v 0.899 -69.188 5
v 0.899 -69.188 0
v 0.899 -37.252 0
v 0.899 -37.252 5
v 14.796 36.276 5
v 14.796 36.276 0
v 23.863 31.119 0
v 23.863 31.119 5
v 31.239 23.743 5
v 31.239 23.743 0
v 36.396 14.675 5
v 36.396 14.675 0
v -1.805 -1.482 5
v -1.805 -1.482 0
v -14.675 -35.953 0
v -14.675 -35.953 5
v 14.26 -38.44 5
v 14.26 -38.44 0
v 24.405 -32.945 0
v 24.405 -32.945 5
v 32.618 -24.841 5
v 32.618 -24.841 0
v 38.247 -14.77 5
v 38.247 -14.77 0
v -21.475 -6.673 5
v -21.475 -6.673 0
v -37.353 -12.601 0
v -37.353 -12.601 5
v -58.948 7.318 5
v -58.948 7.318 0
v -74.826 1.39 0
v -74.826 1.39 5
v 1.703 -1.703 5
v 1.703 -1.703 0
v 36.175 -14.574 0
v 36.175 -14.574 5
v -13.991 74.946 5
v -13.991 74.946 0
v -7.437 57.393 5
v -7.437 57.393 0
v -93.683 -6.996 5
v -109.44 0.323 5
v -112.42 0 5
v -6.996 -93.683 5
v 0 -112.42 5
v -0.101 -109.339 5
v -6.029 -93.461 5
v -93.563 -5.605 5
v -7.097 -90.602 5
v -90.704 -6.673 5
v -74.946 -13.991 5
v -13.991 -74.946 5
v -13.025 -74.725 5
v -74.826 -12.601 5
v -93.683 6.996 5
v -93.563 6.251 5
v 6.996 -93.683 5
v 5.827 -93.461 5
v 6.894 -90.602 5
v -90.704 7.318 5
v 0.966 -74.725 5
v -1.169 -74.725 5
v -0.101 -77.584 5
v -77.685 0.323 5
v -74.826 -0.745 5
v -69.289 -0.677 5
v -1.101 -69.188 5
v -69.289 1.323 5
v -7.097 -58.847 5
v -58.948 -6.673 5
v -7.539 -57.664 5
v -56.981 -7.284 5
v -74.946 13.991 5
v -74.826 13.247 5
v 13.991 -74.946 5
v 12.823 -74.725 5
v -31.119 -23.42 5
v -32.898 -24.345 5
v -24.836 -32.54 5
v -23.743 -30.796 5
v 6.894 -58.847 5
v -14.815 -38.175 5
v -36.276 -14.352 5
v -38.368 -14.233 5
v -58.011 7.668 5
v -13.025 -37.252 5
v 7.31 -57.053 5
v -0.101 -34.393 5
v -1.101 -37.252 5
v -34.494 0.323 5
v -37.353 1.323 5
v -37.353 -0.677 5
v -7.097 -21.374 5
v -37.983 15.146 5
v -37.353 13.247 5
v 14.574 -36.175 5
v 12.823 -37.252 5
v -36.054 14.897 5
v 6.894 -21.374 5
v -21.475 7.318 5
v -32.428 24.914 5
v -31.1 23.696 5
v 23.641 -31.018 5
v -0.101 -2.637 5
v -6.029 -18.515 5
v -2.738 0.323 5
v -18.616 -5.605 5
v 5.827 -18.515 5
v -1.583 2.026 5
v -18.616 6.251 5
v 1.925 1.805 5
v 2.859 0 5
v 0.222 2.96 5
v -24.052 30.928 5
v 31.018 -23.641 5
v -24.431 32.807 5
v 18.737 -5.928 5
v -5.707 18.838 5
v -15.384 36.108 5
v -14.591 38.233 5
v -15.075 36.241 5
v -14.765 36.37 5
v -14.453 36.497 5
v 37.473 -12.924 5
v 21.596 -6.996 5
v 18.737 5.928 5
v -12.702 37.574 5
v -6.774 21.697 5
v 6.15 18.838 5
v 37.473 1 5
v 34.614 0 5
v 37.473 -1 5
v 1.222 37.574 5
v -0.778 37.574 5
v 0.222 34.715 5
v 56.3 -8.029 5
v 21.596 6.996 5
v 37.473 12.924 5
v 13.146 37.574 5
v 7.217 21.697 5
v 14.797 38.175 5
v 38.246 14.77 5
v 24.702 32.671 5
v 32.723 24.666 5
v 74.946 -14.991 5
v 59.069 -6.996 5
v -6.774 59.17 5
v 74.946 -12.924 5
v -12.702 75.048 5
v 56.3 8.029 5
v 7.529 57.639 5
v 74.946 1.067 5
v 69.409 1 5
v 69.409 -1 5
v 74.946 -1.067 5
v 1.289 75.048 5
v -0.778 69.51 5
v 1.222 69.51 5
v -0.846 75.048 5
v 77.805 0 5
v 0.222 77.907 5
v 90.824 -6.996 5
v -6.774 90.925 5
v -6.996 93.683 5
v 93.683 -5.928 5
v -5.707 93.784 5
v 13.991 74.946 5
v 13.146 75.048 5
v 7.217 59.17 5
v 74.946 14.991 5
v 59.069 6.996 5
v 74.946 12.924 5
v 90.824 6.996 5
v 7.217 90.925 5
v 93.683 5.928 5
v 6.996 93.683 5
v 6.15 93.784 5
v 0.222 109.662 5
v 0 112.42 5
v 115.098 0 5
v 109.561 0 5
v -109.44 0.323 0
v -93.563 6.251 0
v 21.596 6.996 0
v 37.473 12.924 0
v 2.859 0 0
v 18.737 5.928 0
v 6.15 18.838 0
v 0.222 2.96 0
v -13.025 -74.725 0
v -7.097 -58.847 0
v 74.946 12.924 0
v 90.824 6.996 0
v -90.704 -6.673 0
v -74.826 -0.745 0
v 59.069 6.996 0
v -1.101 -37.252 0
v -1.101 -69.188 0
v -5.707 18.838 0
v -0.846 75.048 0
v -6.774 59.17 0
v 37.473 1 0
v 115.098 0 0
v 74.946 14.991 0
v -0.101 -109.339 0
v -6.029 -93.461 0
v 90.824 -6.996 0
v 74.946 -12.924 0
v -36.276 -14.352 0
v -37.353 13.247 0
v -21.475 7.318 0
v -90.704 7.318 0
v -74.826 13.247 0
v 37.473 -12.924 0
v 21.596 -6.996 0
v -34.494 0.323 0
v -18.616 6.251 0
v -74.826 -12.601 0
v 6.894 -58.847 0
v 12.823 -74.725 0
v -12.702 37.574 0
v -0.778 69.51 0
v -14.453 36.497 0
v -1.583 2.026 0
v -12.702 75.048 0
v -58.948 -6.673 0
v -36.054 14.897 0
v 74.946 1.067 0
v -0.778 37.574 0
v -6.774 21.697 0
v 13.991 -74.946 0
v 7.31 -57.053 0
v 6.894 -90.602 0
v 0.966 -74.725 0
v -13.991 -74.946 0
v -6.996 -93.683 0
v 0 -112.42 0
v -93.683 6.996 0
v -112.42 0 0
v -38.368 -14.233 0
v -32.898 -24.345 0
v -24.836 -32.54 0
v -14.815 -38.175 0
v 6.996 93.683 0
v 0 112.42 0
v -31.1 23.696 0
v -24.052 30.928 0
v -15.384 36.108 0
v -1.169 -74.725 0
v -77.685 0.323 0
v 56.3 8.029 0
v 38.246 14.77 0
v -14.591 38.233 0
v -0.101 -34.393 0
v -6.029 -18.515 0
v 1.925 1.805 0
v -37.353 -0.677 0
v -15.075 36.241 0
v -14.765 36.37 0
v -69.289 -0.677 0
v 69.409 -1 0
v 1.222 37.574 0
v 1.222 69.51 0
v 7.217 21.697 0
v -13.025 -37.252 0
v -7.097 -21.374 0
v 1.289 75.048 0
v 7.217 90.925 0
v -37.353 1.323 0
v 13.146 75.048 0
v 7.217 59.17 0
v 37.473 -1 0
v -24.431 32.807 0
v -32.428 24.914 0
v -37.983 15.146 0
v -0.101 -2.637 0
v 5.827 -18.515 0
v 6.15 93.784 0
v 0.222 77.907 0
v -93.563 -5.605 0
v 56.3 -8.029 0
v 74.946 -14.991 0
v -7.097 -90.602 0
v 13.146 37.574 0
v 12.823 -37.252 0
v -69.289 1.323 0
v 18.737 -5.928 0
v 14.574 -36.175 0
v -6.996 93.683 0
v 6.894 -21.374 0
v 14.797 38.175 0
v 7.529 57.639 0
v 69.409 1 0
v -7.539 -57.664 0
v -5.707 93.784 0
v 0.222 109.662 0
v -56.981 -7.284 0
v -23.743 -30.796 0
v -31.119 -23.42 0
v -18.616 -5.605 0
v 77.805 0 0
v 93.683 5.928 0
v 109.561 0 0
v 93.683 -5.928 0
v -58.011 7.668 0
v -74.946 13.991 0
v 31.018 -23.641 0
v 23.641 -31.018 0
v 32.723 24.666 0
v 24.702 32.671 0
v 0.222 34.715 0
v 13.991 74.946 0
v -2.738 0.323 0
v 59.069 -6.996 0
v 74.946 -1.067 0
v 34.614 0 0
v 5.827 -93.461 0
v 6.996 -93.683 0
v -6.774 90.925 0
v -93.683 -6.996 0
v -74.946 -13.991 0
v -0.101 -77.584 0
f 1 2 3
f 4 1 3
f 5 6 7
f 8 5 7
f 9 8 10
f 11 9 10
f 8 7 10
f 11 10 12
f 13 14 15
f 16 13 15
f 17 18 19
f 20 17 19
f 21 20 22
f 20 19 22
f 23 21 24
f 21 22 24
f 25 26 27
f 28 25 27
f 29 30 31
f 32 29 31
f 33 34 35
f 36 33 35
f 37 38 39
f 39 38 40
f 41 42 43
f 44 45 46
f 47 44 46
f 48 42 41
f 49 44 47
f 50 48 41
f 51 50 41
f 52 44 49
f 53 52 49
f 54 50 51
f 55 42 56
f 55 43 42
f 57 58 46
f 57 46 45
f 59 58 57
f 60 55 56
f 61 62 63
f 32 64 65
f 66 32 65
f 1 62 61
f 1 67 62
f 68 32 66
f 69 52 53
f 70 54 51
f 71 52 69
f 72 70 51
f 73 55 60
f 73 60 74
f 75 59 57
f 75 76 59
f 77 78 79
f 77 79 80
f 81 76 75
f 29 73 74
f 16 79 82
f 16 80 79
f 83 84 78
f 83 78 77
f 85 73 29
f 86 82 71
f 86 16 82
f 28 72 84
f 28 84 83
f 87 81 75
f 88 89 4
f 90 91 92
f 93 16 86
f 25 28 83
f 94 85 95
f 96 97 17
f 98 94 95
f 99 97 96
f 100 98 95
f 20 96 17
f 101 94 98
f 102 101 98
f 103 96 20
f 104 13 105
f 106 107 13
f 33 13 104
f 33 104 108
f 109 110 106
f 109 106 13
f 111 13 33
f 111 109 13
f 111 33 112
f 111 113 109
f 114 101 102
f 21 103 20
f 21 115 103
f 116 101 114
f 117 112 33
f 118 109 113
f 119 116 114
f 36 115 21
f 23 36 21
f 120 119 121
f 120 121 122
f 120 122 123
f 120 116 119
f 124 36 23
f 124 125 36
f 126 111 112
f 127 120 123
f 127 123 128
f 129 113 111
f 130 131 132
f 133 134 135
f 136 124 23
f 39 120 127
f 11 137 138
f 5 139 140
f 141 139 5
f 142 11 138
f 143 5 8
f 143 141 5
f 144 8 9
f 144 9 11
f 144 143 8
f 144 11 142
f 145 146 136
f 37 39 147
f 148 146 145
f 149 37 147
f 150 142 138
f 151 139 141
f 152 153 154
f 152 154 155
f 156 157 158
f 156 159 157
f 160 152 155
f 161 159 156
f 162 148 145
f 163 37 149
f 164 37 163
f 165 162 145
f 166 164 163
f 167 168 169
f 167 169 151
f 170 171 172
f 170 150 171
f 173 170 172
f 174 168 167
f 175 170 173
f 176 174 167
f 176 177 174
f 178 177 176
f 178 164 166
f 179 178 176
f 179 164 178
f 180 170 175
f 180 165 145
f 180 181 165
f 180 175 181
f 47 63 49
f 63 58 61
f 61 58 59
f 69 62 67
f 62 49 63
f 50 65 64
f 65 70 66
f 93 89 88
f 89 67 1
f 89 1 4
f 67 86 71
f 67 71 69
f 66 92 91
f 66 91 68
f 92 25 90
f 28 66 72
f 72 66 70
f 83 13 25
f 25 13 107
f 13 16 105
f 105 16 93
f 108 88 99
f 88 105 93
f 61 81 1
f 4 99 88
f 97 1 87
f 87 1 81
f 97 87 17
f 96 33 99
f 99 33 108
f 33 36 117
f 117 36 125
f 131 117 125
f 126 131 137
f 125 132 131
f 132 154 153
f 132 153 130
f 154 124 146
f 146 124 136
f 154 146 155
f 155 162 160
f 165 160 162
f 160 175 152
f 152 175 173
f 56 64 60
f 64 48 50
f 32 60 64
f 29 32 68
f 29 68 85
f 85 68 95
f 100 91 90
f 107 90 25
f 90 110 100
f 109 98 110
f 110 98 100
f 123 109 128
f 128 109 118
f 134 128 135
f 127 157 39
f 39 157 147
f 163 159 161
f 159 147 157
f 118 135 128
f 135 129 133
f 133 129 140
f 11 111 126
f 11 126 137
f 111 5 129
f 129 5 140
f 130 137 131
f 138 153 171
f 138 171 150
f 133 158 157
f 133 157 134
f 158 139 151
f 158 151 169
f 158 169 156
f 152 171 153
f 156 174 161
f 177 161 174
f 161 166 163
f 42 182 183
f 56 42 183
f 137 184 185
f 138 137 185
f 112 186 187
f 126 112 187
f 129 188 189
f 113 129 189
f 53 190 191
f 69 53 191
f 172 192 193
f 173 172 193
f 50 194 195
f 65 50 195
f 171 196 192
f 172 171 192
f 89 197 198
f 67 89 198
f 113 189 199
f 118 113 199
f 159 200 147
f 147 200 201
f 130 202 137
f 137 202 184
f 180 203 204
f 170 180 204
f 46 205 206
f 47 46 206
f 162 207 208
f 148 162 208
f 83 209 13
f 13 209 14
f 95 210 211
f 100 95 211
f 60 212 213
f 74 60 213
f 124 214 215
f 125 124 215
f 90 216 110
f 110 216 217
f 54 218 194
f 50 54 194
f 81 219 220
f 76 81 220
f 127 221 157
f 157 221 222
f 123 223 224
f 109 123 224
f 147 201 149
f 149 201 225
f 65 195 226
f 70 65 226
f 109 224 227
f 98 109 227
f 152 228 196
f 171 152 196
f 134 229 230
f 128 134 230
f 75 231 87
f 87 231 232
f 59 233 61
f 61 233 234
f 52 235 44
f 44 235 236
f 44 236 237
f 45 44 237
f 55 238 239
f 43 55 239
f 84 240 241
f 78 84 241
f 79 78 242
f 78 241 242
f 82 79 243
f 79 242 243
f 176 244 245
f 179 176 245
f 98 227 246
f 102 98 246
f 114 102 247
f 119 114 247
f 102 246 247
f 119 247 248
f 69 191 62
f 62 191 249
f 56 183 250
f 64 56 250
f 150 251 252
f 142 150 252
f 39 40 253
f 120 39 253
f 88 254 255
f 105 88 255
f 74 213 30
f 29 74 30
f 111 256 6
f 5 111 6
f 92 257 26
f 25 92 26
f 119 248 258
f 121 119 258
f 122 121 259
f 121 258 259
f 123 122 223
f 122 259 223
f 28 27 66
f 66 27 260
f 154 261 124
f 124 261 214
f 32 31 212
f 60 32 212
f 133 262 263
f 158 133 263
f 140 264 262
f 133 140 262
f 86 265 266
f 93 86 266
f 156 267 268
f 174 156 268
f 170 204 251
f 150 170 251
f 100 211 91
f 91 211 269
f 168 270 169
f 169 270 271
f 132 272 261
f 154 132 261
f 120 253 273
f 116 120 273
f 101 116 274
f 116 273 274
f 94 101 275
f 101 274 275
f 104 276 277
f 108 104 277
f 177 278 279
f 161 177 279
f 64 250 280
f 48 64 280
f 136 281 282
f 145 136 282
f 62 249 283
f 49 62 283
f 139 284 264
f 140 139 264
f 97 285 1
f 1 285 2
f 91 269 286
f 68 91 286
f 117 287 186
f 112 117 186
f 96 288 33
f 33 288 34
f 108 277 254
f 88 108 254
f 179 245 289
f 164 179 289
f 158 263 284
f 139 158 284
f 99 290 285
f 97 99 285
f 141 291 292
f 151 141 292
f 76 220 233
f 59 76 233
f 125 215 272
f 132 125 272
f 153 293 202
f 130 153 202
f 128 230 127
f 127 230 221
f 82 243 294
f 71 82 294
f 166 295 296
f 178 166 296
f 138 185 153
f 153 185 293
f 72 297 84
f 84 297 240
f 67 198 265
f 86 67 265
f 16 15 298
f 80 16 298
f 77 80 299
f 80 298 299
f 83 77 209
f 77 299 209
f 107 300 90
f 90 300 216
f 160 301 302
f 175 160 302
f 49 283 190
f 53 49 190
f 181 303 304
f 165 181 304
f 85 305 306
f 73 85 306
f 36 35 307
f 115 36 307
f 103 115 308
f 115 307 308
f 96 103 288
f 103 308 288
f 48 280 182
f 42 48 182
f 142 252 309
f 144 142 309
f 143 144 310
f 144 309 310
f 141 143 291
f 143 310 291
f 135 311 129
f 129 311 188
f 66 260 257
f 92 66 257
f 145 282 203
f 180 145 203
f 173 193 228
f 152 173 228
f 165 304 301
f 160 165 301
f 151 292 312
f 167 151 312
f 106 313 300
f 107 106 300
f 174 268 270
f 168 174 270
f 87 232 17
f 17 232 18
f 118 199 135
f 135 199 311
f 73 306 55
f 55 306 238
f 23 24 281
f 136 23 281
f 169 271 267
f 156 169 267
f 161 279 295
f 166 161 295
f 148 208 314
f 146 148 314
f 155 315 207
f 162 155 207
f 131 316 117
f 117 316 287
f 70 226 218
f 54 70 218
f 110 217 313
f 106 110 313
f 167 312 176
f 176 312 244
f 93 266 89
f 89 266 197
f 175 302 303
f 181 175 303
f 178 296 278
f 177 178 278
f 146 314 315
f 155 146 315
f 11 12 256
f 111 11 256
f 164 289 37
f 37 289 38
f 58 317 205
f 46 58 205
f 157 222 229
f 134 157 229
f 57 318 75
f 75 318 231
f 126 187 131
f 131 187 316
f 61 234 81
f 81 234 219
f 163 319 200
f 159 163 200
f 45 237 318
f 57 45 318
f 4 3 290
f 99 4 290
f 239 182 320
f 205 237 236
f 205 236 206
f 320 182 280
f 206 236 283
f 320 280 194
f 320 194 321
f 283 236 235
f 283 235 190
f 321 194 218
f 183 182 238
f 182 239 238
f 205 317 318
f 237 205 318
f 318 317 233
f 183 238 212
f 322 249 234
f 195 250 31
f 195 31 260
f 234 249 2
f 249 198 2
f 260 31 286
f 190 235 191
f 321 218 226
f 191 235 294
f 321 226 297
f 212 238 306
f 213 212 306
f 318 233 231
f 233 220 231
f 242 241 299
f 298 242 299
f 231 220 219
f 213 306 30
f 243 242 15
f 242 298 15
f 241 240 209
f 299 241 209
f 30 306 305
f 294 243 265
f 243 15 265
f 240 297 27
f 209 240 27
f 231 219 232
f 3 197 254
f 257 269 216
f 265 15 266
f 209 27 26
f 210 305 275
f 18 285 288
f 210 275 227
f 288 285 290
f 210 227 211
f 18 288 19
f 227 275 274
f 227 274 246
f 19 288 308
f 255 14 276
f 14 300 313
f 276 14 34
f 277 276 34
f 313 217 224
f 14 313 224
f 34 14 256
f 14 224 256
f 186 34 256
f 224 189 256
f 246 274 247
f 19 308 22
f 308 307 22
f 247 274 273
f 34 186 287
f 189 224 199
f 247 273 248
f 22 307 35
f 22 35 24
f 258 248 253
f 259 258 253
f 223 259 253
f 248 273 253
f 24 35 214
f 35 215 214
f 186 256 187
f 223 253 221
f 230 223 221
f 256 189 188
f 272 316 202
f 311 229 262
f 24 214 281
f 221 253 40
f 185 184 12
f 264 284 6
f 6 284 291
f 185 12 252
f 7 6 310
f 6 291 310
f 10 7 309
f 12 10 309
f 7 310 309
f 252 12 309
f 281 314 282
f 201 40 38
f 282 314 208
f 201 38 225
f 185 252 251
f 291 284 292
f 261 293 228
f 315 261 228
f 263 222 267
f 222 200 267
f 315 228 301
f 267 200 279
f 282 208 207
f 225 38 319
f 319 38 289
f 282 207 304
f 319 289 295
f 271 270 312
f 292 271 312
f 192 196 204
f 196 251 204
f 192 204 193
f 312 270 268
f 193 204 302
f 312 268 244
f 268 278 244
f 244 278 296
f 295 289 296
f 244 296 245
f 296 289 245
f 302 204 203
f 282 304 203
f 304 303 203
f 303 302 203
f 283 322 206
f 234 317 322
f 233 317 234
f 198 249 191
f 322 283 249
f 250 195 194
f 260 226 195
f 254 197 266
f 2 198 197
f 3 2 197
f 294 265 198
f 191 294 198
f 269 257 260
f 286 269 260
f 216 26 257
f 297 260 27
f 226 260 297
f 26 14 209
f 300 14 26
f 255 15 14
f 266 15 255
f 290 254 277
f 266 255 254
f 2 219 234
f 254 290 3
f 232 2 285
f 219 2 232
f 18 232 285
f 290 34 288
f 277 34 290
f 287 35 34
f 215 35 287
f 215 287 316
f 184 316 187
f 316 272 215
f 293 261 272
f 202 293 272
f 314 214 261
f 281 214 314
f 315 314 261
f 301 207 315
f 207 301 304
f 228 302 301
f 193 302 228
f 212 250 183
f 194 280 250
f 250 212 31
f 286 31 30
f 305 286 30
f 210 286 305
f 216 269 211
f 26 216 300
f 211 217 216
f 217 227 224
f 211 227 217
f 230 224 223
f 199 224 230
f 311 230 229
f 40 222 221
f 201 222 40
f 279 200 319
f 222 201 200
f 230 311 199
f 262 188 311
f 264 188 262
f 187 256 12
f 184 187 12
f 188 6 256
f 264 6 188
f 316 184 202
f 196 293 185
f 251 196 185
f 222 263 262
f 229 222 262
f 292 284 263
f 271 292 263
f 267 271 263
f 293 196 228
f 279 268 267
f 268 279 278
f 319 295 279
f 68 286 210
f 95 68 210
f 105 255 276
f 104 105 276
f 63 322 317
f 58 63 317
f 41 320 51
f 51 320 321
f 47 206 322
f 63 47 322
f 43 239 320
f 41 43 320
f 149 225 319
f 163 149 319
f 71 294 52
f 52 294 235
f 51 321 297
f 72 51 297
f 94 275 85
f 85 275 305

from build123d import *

# Parameters (mm, degrees)
F1_DEPTH = 5


with BuildPart() as f1:
    # F0 (on Top) → F1 (new body)
    with BuildSketch(Plane.XY):
        Polygon((-7.4373828532, 57.3930200385), (-6.9956349455, 56.209873024), (0, 74.9464973654), (-6.9956349455, 93.6831217067), (-13.9912698911, 74.9464973654), align=None)
        Polygon((-0.8457273018, 75.0476539377), (-6.7739341111, 59.16995522), (-12.7021409204, 75.0476539377), (-6.7739341111, 90.9253526553), align=None, mode=Mode.SUBTRACT)
        Polygon((-6.9956349455, 93.6831217067), (0, 74.9464973654), (6.9956349455, 93.6831217067), (0, 112.4197460481), align=None)
        Polygon((0.2217008345, 109.6619769966), (6.1499076438, 93.784278279), (0.2217008345, 77.9065795614), (-5.7065059748, 93.784278279), align=None, mode=Mode.SUBTRACT)
        Polygon((6.9956349455, 93.6831217067), (0, 74.9464973654), (6.9956349455, 56.209873024), (7.5293490137, 57.6393358359), (13.9912698911, 74.9464973654), align=None)
        Polygon((7.21733578, 90.9253526553), (13.1455425893, 75.0476539377), (7.21733578, 59.16995522), (1.2891289707, 75.0476539377), align=None, mode=Mode.SUBTRACT)
        Polygon((0, 37.4732486827), (6.9956349455, 18.7366243413), (13.9912698911, 37.4732486827), (6.9956349455, 56.209873024), (0, 74.9464973654), align=None)
        Polygon((7.21733578, 21.6967065374), (1.2217008345, 37.574405255), (1.2217008345, 69.5103975424), (13.1455425893, 37.574405255), align=None, mode=Mode.SUBTRACT)
        Polygon((-13.9912698911, 37.4732486827), (-6.9956349455, 18.7366243413), (0, 37.4732486827), (0, 74.9464973654), (-6.9956349455, 56.209873024), align=None)
        Polygon((-0.7782991655, 37.574405255), (-6.7739341111, 21.6967065374), (-12.7021409204, 37.574405255), (-0.7782991655, 69.5103975424), align=None, mode=Mode.SUBTRACT)
        Polygon((-6.9956349455, 18.7366243413), (0, 0), (6.9956349455, 18.7366243413), (0, 37.4732486827), align=None)
        Polygon((0.2217008345, 2.960082196), (-5.7065059748, 18.8377809136), (0.2217008345, 34.7154796313), (6.1499076438, 18.8377809136), align=None, mode=Mode.SUBTRACT)
        with BuildLine():
            Line((6.9956349455, 18.7366243413), (0, 0))
            Line((0, 0), (18.7366243413, 6.9956349455))
            Line((18.7366243413, 6.9956349455), (37.4732486827, 13.9912698911))
            ThreePointArc((37.4732486827, 13.9912698911), (28.2842712475, 28.2842712475), (13.9912698911, 37.4732486827))
            Line((13.9912698911, 37.4732486827), (6.9956349455, 18.7366243413))
        make_face()
        with BuildLine():
            Line((1.9251347893, 1.8045905271), (14.7955350767, 36.2757796592))
            ThreePointArc((14.7955350767, 36.2757796592), (27.7988653008, 27.6783210386), (36.3963239214, 14.6749908145))
            Line((36.3963239214, 14.6749908145), (1.9251347893, 1.8045905271))
        make_face(mode=Mode.SUBTRACT)
        with BuildLine():
            Line((6.9956349455, 56.209873024), (13.9912698911, 37.4732486827))
            ThreePointArc((13.9912698911, 37.4732486827), (28.2842712475, 28.2842712475), (37.4732486827, 13.9912698911))
            Line((37.4732486827, 13.9912698911), (56.209873024, 6.9956349455))
            Line((56.209873024, 6.9956349455), (57.6393358359, 7.5293490137))
            Line((57.6393358359, 7.5293490137), (56.3001704501, 8.0293490137))
            Line((56.3001704501, 8.0293490137), (38.2461327523, 14.7701287147))
            ThreePointArc((38.2461327523, 14.7701287147), (28.9907831637, 28.9467641394), (14.7966128721, 38.1751994187))
            Line((14.7966128721, 38.1751994187), (7.5293490137, 57.6393358359))
            Line((7.5293490137, 57.6393358359), (6.9956349455, 56.209873024))
        make_face()
        with BuildLine():
            Line((-56.209873024, 6.9956349455), (-37.4732486827, 13.9912698911))
            ThreePointArc((-37.4732486827, 13.9912698911), (-28.6737428311, 27.8893612701), (-15.0250008461, 37.0708692854))
            Line((-15.0250008461, 37.0708692854), (-14.5912080836, 38.2327097895))
            ThreePointArc((-14.5912080836, 38.2327097895), (-28.7014097963, 29.1358891634), (-37.9826996881, 15.1463360675))
            Line((-37.9826996881, 15.1463360675), (-58.0114231685, 7.6682740996))
            Line((-58.0114231685, 7.6682740996), (-56.209873024, 6.9956349455))
        make_face()
        with BuildLine():
            ThreePointArc((-15.0250008461, 37.0708692854), (-14.5095302876, 37.2756425945), (-13.9912698911, 37.4732486827))
            Line((-13.9912698911, 37.4732486827), (-6.9956349455, 56.209873024))
            Line((-6.9956349455, 56.209873024), (-7.4373828532, 57.3930200385))
            Line((-7.4373828532, 57.3930200385), (-14.5912080836, 38.2327097895))
            Line((-14.5912080836, 38.2327097895), (-15.0250008461, 37.0708692854))
        make_face()
        with BuildLine():
            Line((-18.7366243413, 6.9956349455), (0, 0))
            Line((0, 0), (-6.9956349455, 18.7366243413))
            Line((-6.9956349455, 18.7366243413), (-13.9912698911, 37.4732486827))
            ThreePointArc((-13.9912698911, 37.4732486827), (-14.5095302876, 37.2756425945), (-15.0250008461, 37.0708692854))
            ThreePointArc((-15.0250008461, 37.0708692854), (-28.6737428311, 27.8893612701), (-37.4732486827, 13.9912698911))
            Line((-37.4732486827, 13.9912698911), (-18.7366243413, 6.9956349455))
        make_face()
        with BuildLine():
            ThreePointArc((-36.0540788247, 14.896691649), (-27.8111096303, 27.5409159494), (-15.3843983132, 36.1082839898))
            ThreePointArc((-15.3843983132, 36.1082839898), (-14.9201030706, 36.3058940742), (-14.45328998, 36.4974804937))
            Line((-14.45328998, 36.4974804937), (-1.5828896926, 2.0262913616))
            Line((-1.5828896926, 2.0262913616), (-36.0540788247, 14.896691649))
        make_face(mode=Mode.SUBTRACT)
        Polygon((37.4732486827, 13.9912698911), (18.7366243413, 6.9956349455), (37.4732486827, 0), (74.9464973654, 0), (56.209873024, 6.9956349455), align=None)
        Polygon((37.4732486827, 1), (21.5955499651, 6.9956349455), (37.4732486827, 12.9238417549), (69.4092409701, 1), align=None, mode=Mode.SUBTRACT)
        Polygon((18.7366243413, 6.9956349455), (0, 0), (18.7366243413, -6.9956349455), (37.4732486827, 0), align=None)
        Polygon((18.7366243413, -5.9282068093), (2.8589256237, 0), (18.7366243413, 5.9282068093), (34.614323059, 0), align=None, mode=Mode.SUBTRACT)
        Polygon((56.209873024, 6.9956349455), (74.9464973654, 0), (93.6831217067, 6.9956349455), (74.9464973654, 13.9912698911), (57.6393358359, 7.5293490137), align=None)
        Polygon((74.9464973654, 1.0674281362), (59.0687986478, 6.9956349455), (74.9464973654, 12.9238417549), (90.824196083, 6.9956349455), align=None, mode=Mode.SUBTRACT)
        Polygon((93.6831217067, 6.9956349455), (74.9464973654, 0), (93.6831217067, -6.9956349455), (112.4197460481, 0), align=None)
        Polygon((93.6831217067, -5.9282068093), (77.8054229891, 0), (93.6831217067, 5.9282068093), (109.5608204243, 0), align=None, mode=Mode.SUBTRACT)
        Polygon((93.6831217067, -6.9956349455), (74.9464973654, 0), (56.209873024, -6.9956349455), (57.6393358359, -7.5293490137), (74.9464973654, -13.9912698911), align=None)
        Polygon((74.9464973654, -12.9238417549), (59.0687986478, -6.9956349455), (74.9464973654, -1.0674281362), (90.824196083, -6.9956349455), align=None, mode=Mode.SUBTRACT)
        Polygon((37.4732486827, 0), (18.7366243413, -6.9956349455), (37.4732486827, -13.9912698911), (56.209873024, -6.9956349455), (74.9464973654, 0), align=None)
        Polygon((37.4732486827, -1), (69.4092409701, -1), (37.4732486827, -12.9238417549), (21.5955499651, -6.9956349455), align=None, mode=Mode.SUBTRACT)
        with BuildLine():
            ThreePointArc((37.4732486827, -13.9912698911), (28.2842712475, -28.2842712475), (13.9912698911, -37.4732486827))
            Line((13.9912698911, -37.4732486827), (6.9956349455, -56.209873024))
            Line((6.9956349455, -56.209873024), (7.310483144, -57.0531406424))
            Line((7.310483144, -57.0531406424), (14.2599095347, -38.4402780956))
            ThreePointArc((14.2599095347, -38.4402780956), (28.7980210171, -29.1834539679), (38.2473032728, -14.7696916812))
            Line((38.2473032728, -14.7696916812), (56.3001704501, -8.0293490137))
            Line((56.3001704501, -8.0293490137), (57.6393358359, -7.5293490137))
            Line((57.6393358359, -7.5293490137), (56.209873024, -6.9956349455))
            Line((56.209873024, -6.9956349455), (37.4732486827, -13.9912698911))
        make_face()
        with BuildLine():
            Line((18.7366243413, -6.9956349455), (0, 0))
            Line((0, 0), (6.9956349455, -18.7366243413))
            Line((6.9956349455, -18.7366243413), (13.9912698911, -37.4732486827))
            ThreePointArc((13.9912698911, -37.4732486827), (28.2842712475, -28.2842712475), (37.4732486827, -13.9912698911))
            Line((37.4732486827, -13.9912698911), (18.7366243413, -6.9956349455))
        make_face()
        with BuildLine():
            Line((14.5738342422, -36.1746230869), (1.7034339548, -1.7034339548))
            Line((1.7034339548, -1.7034339548), (36.1746230869, -14.5738342422))
            ThreePointArc((36.1746230869, -14.5738342422), (27.5771644663, -27.5771644663), (14.5738342422, -36.1746230869))
        make_face(mode=Mode.SUBTRACT)
        Polygon((-18.7366243413, -6.9956349455), (0, 0), (-18.7366243413, 6.9956349455), (-37.4732486827, 0), align=None)
        Polygon((-2.7383813615, 0.3228574068), (-18.6160800791, -5.6053494025), (-34.4937787968, 0.3228574068), (-18.6160800791, 6.2510642161), align=None, mode=Mode.SUBTRACT)
        Polygon((-37.4732486827, 0), (-18.7366243413, 6.9956349455), (-37.4732486827, 13.9912698911), (-56.209873024, 6.9956349455), (-74.9464973654, 0), align=None)
        Polygon((-21.4750057029, 7.3184923523), (-37.3527044205, 1.3228574068), (-69.2886967079, 1.3228574068), (-37.3527044205, 13.2466991616), align=None, mode=Mode.SUBTRACT)
        Polygon((-37.4732486827, -13.9912698911), (-18.7366243413, -6.9956349455), (-37.4732486827, 0), (-74.9464973654, 0), (-56.209873024, -6.9956349455), align=None)
        Polygon((-37.3527044205, -0.6771425932), (-21.4750057029, -6.6727775388), (-37.3527044205, -12.6009843481), (-69.2886967079, -0.6771425932), align=None, mode=Mode.SUBTRACT)
        with BuildLine():
            Line((-6.9956349455, -18.7366243413), (0, 0))
            Line((0, 0), (-18.7366243413, -6.9956349455))
            Line((-18.7366243413, -6.9956349455), (-37.4732486827, -13.9912698911))
            ThreePointArc((-37.4732486827, -13.9912698911), (-37.3458271608, -14.3279165853), (-37.2153813915, -14.6634030117))
            ThreePointArc((-37.2153813915, -14.6634030117), (-28.0286023337, -28.5376497144), (-13.9912698911, -37.4732486827))
            Line((-13.9912698911, -37.4732486827), (-6.9956349455, -18.7366243413))
        make_face()
        with BuildLine():
            Line((-1.8045905271, -1.4817331203), (-14.6749908145, -35.9529222524))
            ThreePointArc((-14.6749908145, -35.9529222524), (-27.6783210386, -27.3554636318), (-36.2757796592, -14.3521334077))
            Line((-36.2757796592, -14.3521334077), (-1.8045905271, -1.4817331203))
        make_face(mode=Mode.SUBTRACT)
        Polygon((6.9956349455, -18.7366243413), (0, 0), (-6.9956349455, -18.7366243413), (0, -37.4732486827), align=None)
        Polygon((-0.1011565723, -2.6372247892), (5.827050237, -18.5149235069), (-0.1011565723, -34.3926222245), (-6.0293633816, -18.5149235069), align=None, mode=Mode.SUBTRACT)
        Polygon((-56.209873024, -6.9956349455), (-74.9464973654, 0), (-93.6831217067, -6.9956349455), (-74.9464973654, -13.9912698911), (-56.9810367882, -7.2835619531), align=None)
        Polygon((-74.8259531032, -12.6009843481), (-90.7036518208, -6.6727775388), (-74.8259531032, -0.7445707295), (-58.9482543856, -6.6727775388), align=None, mode=Mode.SUBTRACT)
        Polygon((-93.6831217067, 6.9956349455), (-74.9464973654, 0), (-56.209873024, 6.9956349455), (-58.0114231685, 7.6682740996), (-74.9464973654, 13.9912698911), align=None)
        Polygon((-90.7036518208, 7.3184923523), (-74.8259531032, 13.2466991616), (-58.9482543856, 7.3184923523), (-74.8259531032, 1.390285543), align=None, mode=Mode.SUBTRACT)
        Polygon((-93.6831217067, -6.9956349455), (-74.9464973654, 0), (-93.6831217067, 6.9956349455), (-112.4197460481, 0), align=None)
        Polygon((-109.4402761622, 0.3228574068), (-93.5625774445, 6.2510642161), (-77.6848787269, 0.3228574068), (-93.5625774445, -5.6053494025), align=None, mode=Mode.SUBTRACT)
        with BuildLine():
            Line((-6.9956349455, -56.209873024), (-13.9912698911, -37.4732486827))
            ThreePointArc((-13.9912698911, -37.4732486827), (-28.0286023337, -28.5376497144), (-37.2153813915, -14.6634030117))
            Line((-37.2153813915, -14.6634030117), (-38.3681742414, -14.2329883437))
            ThreePointArc((-38.3681742414, -14.2329883437), (-29.1556015148, -28.7261871431), (-14.8151520653, -38.1747752529))
            Line((-14.8151520653, -38.1747752529), (-7.5385394255, -57.6639507988))
            Line((-7.5385394255, -57.6639507988), (-6.9956349455, -56.209873024))
        make_face()
        with BuildLine():
            ThreePointArc((-37.2153813915, -14.6634030117), (-37.3458271608, -14.3279165853), (-37.4732486827, -13.9912698911))
            Line((-37.4732486827, -13.9912698911), (-56.209873024, -6.9956349455))
            Line((-56.209873024, -6.9956349455), (-56.9810367882, -7.2835619531))
            Line((-56.9810367882, -7.2835619531), (-38.3681742414, -14.2329883437))
            Line((-38.3681742414, -14.2329883437), (-37.2153813915, -14.6634030117))
        make_face()
        Polygon((13.9912698911, -37.4732486827), (6.9956349455, -18.7366243413), (0, -37.4732486827), (0, -74.9464973654), (6.9956349455, -56.209873024), align=None)
        Polygon((0.8988434277, -37.2515478482), (6.8944783733, -21.3738491306), (12.8226851826, -37.2515478482), (0.8988434277, -69.1875401356), align=None, mode=Mode.SUBTRACT)
        Polygon((0, -37.4732486827), (-6.9956349455, -18.7366243413), (-13.9912698911, -37.4732486827), (-6.9956349455, -56.209873024), (0, -74.9464973654), align=None)
        Polygon((-7.0967915178, -21.3738491306), (-1.1011565723, -37.2515478482), (-1.1011565723, -69.1875401356), (-13.0249983271, -37.2515478482), align=None, mode=Mode.SUBTRACT)
        Polygon((-6.9956349455, -93.6831217067), (0, -74.9464973654), (-6.9956349455, -56.209873024), (-7.5385394255, -57.6639507988), (-13.9912698911, -74.9464973654), align=None)
        Polygon((-13.0249983271, -74.7247965309), (-7.0967915178, -58.8470978133), (-1.1685847085, -74.7247965309), (-7.0967915178, -90.6024952485), align=None, mode=Mode.SUBTRACT)
        Polygon((6.9956349455, -56.209873024), (0, -74.9464973654), (6.9956349455, -93.6831217067), (13.9912698911, -74.9464973654), (7.310483144, -57.0531406424), align=None)
        Polygon((12.8226851826, -74.7247965309), (6.8944783733, -90.6024952485), (0.9662715639, -74.7247965309), (6.8944783733, -58.8470978133), align=None, mode=Mode.SUBTRACT)
        Polygon((6.9956349455, -93.6831217067), (0, -74.9464973654), (-6.9956349455, -93.6831217067), (0, -112.4197460481), align=None)
        Polygon((-0.1011565723, -109.3391195899), (-6.0293633816, -93.4614208722), (-0.1011565723, -77.5837221546), (5.827050237, -93.4614208722), align=None, mode=Mode.SUBTRACT)
        Polygon((112.4197460481, 0), (93.6831217067, -6.9956349455), (74.9464973654, -13.9912698911), (57.6393358359, -7.5293490137), (56.3001704501, -8.0293490137), (74.9464973654, -14.9912698911), (115.0980768196, 0), (74.9464973654, 14.9912698911), (56.3001704501, 8.0293490137), (57.6393358359, 7.5293490137), (74.9464973654, 13.9912698911), (93.6831217067, 6.9956349455), align=None)
    extrude(amount=F1_DEPTH)


solid = f1.part
